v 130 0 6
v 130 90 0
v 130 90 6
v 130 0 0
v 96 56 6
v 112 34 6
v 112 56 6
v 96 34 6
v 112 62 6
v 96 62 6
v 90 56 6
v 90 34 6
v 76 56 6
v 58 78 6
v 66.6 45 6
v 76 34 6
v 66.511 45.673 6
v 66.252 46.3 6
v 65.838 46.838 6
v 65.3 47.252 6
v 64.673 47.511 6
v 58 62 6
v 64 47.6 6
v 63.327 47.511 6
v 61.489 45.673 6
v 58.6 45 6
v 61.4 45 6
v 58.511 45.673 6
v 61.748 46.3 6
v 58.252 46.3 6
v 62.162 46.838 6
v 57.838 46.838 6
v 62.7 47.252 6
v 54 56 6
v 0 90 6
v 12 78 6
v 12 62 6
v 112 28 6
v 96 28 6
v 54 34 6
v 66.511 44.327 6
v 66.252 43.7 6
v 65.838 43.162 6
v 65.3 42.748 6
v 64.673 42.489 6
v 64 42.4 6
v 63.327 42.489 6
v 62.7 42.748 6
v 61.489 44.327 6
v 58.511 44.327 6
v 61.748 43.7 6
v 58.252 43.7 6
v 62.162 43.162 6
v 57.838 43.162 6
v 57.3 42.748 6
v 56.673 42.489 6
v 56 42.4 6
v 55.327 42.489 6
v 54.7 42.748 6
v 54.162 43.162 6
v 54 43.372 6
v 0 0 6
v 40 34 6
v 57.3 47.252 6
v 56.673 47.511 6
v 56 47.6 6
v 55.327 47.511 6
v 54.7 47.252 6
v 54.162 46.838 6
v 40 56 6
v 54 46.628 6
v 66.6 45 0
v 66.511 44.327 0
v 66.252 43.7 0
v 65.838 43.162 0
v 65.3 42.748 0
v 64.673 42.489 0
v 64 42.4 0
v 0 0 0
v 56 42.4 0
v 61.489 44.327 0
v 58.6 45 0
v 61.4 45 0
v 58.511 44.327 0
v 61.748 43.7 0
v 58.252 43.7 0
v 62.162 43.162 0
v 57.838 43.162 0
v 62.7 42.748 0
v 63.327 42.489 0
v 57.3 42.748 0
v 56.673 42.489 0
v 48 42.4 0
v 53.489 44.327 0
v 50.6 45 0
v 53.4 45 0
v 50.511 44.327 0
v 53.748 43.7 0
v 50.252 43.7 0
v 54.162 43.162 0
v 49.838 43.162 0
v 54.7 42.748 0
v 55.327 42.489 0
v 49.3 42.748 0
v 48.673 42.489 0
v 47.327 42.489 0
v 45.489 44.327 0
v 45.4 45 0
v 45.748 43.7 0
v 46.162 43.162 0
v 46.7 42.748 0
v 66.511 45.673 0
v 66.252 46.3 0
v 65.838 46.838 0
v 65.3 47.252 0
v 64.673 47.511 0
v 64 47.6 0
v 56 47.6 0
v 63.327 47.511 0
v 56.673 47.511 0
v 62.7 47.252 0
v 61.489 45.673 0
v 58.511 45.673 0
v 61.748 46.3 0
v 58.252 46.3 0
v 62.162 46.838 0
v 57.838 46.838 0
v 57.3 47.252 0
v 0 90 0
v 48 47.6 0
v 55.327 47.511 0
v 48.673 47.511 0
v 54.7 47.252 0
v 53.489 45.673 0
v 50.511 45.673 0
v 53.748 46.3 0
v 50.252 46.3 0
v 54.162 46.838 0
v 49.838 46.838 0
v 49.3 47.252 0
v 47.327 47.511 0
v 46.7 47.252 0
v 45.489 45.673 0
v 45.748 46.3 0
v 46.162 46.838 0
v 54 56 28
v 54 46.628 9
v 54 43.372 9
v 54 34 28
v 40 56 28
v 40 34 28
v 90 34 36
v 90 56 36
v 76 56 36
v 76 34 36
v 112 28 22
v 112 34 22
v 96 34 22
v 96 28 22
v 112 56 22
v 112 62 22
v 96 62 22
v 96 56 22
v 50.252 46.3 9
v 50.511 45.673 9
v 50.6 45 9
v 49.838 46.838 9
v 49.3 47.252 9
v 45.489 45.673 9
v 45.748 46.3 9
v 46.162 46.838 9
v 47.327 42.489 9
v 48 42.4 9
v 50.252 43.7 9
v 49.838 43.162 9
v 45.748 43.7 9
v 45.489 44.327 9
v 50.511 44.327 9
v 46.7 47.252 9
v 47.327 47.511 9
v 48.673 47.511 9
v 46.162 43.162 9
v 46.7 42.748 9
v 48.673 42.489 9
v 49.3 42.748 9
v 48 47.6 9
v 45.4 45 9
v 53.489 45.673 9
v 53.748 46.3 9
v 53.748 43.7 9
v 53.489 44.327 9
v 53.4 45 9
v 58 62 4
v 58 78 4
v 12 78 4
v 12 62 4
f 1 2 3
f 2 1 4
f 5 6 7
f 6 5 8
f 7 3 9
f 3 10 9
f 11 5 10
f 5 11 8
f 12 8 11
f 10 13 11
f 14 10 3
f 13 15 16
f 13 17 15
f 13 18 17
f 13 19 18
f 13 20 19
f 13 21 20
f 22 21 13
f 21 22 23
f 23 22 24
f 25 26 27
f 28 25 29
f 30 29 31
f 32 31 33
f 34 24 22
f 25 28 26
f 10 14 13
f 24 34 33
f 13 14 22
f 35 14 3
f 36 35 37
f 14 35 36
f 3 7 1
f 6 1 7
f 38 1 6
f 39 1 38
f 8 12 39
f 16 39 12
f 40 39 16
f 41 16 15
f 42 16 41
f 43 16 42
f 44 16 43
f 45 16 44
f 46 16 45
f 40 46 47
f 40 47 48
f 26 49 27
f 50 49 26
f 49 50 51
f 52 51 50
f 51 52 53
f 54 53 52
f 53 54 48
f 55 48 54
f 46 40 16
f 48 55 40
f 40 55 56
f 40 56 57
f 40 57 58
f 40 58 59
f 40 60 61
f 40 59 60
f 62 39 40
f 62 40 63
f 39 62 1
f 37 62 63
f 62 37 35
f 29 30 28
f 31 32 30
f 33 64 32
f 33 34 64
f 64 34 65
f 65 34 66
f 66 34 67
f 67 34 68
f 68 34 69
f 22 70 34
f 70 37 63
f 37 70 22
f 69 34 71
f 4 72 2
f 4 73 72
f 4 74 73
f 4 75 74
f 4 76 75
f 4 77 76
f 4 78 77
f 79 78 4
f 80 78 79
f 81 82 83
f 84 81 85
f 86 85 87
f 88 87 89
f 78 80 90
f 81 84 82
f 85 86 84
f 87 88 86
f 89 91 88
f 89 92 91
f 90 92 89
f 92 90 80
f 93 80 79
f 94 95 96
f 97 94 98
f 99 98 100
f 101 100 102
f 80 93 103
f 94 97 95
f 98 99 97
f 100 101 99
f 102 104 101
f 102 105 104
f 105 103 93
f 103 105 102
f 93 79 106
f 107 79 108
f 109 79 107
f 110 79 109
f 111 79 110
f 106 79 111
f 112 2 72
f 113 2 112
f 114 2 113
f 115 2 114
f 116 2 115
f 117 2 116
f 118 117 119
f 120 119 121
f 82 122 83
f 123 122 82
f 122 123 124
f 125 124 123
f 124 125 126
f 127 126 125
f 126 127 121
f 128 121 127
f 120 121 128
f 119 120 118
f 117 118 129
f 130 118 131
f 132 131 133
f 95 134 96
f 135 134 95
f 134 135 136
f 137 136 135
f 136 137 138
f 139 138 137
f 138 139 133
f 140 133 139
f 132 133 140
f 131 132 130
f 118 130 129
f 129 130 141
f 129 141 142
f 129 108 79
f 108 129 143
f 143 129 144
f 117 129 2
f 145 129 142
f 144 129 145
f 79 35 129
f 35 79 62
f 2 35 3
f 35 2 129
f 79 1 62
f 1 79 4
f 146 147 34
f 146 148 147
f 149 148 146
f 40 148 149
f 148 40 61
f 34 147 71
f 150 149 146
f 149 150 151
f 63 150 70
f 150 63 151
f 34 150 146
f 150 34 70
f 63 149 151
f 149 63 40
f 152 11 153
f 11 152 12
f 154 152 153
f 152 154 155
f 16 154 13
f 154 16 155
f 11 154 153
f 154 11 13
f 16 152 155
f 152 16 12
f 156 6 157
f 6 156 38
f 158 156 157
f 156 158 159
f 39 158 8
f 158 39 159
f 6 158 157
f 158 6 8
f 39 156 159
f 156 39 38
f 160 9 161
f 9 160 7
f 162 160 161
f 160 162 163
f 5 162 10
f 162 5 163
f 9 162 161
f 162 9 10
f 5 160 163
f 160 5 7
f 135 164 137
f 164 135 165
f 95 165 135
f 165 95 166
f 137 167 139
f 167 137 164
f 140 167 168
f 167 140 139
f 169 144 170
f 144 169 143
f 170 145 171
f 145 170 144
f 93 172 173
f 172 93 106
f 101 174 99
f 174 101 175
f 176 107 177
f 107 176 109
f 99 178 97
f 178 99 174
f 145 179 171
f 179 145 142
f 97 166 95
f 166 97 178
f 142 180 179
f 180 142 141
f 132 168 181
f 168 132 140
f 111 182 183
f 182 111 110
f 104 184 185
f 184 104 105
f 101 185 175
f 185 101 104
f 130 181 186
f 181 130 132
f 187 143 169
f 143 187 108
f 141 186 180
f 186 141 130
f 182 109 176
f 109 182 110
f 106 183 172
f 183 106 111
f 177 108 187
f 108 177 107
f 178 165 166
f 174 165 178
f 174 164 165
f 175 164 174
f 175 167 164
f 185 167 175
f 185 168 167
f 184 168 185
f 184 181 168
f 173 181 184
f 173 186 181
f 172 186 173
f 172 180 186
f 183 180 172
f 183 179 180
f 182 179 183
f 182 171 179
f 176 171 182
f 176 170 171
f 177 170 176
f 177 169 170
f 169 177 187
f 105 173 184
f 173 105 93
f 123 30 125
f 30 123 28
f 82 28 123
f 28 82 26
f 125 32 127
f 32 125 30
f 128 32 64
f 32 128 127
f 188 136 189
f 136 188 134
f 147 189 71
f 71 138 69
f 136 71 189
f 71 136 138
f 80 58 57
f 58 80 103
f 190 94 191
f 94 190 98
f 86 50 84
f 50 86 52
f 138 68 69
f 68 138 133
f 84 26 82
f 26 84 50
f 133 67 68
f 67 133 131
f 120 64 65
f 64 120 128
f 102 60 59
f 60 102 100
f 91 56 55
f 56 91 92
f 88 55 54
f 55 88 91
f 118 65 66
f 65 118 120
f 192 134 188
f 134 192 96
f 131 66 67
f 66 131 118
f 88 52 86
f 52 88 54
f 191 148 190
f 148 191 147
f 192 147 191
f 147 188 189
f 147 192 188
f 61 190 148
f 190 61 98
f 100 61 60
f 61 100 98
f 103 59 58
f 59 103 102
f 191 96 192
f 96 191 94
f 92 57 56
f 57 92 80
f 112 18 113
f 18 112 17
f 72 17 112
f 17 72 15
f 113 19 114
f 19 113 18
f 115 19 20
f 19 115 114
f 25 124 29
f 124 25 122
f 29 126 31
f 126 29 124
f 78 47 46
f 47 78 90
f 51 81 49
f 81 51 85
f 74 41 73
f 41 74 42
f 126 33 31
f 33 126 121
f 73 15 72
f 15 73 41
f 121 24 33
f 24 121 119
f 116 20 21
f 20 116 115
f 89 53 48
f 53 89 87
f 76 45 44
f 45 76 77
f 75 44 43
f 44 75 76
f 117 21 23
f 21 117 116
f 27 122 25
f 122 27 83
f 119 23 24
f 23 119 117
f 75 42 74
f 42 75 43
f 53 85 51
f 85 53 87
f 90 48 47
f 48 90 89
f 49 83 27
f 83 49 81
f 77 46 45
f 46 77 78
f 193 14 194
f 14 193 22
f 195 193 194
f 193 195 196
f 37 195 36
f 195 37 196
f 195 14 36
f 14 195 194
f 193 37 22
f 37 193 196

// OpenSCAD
// Crank-Gear Mini Catapult — starter template for Jordan Glen grades 7-8.
// Ratio = gear_teeth / pinion_teeth. The starter is 36 / 12 = 3.
// Render one part:
//   openscad -D 'part="gear"' -o gear-36t.stl crank-catapult.scad
// Launch soft pom-poms only. Aim away from people.
// Moving holes are 0.2–0.3 mm larger than the pins. The shipped STLs
// come from ../build_models.py using these dimensions.

part = "base"; // base, pinion, gear, crank, axle, arm, hinge_pin, stop_peg, name_plate

module_m = 1.5;
pinion_teeth = 12;
gear_teeth = 36;
backlash = 0.2;
axle_d = 5.0;
axle_hole_d = 5.3; // 0.3 mm clearance
center = (pinion_teeth + gear_teeth) * module_m / 2;

module spur(teeth, thickness, bore) {
  pitch_r = module_m * teeth / 2;
  tip_r = pitch_r + module_m;
  root_r = pitch_r - 1.25 * module_m;
  step = 360 / teeth;
  difference() {
    union() {
      cylinder(h = thickness, r = root_r, $fn = 64);
      for (k = [0 : teeth - 1]) {
        rotate([0, 0, k * step])
          linear_extrude(height = thickness)
            polygon([
              [-1.15, root_r - 0.2],
              [-0.45, tip_r],
              [0.45, tip_r],
              [1.15, root_r - 0.2]
            ]);
      }
    }
    translate([0, 0, -1]) cylinder(h = thickness + 2, d = bore, $fn = 36);
  }
}

module base() {
  difference() {
    union() {
      cube([130, 90, 6]);
      translate([40, 34, 6]) cube([14, 22, 22]);
      translate([76, 34, 6]) cube([14, 22, 30]);
      translate([96, 28, 6]) cube([16, 6, 16]);
      translate([96, 56, 6]) cube([16, 6, 16]);
    }
    translate([47, 30, 24]) rotate([90, 0, 0]) cylinder(h = 30, d = axle_hole_d, $fn = 32);
    translate([83, 30, 28]) rotate([90, 0, 0]) cylinder(h = 30, d = axle_hole_d, $fn = 32);
    translate([104, 20, 18]) rotate([90, 0, 0]) cylinder(h = 40, d = axle_hole_d, $fn = 32);
    for (x = [48, 56, 64]) translate([x, 45, -1]) cylinder(h = 10, d = 5.2, $fn = 24);
    translate([12, 62, 4]) cube([46, 16, 3]);
  }
}

module crank() {
  difference() {
    union() {
      cylinder(h = 6, d = 16, $fn = 40);
      translate([0, -6, 0]) cube([40, 12, 6]);
      translate([36, 0, 0]) cylinder(h = 16, d = 8.4, $fn = 32);
    }
    translate([0, 0, -1]) cylinder(h = 10, d = 5.2, $fn = 32);
  }
}

module axle() {
  cylinder(h = 32, d = axle_d, $fn = 32);
  cylinder(h = 2.4, d = 8.4, $fn = 32);
}

module arm() {
  difference() {
    union() {
      translate([0, -7, 0]) cube([78, 14, 8]);
      rotate([90, 0, 0]) cylinder(h = 14, d = 12, center = true, $fn = 32);
      translate([64, -11, 4]) cube([22, 22, 8]);
    }
    rotate([90, 0, 0]) cylinder(h = 20, d = axle_hole_d, center = true, $fn = 28);
    translate([70, -7, 6]) cube([14, 14, 8]);
  }
}

module hinge_pin() {
  cylinder(h = 28, d = 5, $fn = 28);
  cylinder(h = 2.4, d = 8.8, $fn = 28);
}

module stop_peg() {
  cylinder(h = 12, d = 4.8, $fn = 24);
  translate([0, 0, 10]) cylinder(h = 2.4, d = 10, $fn = 24);
}

if (part == "base") base();
else if (part == "pinion") spur(pinion_teeth, 6, 5.2);
else if (part == "gear") spur(gear_teeth, 6, 5.2);
else if (part == "crank") crank();
else if (part == "axle") axle();
else if (part == "arm") arm();
else if (part == "hinge_pin") hinge_pin();
else if (part == "stop_peg") stop_peg();
else if (part == "name_plate") cube([42, 14, 2.2]);
